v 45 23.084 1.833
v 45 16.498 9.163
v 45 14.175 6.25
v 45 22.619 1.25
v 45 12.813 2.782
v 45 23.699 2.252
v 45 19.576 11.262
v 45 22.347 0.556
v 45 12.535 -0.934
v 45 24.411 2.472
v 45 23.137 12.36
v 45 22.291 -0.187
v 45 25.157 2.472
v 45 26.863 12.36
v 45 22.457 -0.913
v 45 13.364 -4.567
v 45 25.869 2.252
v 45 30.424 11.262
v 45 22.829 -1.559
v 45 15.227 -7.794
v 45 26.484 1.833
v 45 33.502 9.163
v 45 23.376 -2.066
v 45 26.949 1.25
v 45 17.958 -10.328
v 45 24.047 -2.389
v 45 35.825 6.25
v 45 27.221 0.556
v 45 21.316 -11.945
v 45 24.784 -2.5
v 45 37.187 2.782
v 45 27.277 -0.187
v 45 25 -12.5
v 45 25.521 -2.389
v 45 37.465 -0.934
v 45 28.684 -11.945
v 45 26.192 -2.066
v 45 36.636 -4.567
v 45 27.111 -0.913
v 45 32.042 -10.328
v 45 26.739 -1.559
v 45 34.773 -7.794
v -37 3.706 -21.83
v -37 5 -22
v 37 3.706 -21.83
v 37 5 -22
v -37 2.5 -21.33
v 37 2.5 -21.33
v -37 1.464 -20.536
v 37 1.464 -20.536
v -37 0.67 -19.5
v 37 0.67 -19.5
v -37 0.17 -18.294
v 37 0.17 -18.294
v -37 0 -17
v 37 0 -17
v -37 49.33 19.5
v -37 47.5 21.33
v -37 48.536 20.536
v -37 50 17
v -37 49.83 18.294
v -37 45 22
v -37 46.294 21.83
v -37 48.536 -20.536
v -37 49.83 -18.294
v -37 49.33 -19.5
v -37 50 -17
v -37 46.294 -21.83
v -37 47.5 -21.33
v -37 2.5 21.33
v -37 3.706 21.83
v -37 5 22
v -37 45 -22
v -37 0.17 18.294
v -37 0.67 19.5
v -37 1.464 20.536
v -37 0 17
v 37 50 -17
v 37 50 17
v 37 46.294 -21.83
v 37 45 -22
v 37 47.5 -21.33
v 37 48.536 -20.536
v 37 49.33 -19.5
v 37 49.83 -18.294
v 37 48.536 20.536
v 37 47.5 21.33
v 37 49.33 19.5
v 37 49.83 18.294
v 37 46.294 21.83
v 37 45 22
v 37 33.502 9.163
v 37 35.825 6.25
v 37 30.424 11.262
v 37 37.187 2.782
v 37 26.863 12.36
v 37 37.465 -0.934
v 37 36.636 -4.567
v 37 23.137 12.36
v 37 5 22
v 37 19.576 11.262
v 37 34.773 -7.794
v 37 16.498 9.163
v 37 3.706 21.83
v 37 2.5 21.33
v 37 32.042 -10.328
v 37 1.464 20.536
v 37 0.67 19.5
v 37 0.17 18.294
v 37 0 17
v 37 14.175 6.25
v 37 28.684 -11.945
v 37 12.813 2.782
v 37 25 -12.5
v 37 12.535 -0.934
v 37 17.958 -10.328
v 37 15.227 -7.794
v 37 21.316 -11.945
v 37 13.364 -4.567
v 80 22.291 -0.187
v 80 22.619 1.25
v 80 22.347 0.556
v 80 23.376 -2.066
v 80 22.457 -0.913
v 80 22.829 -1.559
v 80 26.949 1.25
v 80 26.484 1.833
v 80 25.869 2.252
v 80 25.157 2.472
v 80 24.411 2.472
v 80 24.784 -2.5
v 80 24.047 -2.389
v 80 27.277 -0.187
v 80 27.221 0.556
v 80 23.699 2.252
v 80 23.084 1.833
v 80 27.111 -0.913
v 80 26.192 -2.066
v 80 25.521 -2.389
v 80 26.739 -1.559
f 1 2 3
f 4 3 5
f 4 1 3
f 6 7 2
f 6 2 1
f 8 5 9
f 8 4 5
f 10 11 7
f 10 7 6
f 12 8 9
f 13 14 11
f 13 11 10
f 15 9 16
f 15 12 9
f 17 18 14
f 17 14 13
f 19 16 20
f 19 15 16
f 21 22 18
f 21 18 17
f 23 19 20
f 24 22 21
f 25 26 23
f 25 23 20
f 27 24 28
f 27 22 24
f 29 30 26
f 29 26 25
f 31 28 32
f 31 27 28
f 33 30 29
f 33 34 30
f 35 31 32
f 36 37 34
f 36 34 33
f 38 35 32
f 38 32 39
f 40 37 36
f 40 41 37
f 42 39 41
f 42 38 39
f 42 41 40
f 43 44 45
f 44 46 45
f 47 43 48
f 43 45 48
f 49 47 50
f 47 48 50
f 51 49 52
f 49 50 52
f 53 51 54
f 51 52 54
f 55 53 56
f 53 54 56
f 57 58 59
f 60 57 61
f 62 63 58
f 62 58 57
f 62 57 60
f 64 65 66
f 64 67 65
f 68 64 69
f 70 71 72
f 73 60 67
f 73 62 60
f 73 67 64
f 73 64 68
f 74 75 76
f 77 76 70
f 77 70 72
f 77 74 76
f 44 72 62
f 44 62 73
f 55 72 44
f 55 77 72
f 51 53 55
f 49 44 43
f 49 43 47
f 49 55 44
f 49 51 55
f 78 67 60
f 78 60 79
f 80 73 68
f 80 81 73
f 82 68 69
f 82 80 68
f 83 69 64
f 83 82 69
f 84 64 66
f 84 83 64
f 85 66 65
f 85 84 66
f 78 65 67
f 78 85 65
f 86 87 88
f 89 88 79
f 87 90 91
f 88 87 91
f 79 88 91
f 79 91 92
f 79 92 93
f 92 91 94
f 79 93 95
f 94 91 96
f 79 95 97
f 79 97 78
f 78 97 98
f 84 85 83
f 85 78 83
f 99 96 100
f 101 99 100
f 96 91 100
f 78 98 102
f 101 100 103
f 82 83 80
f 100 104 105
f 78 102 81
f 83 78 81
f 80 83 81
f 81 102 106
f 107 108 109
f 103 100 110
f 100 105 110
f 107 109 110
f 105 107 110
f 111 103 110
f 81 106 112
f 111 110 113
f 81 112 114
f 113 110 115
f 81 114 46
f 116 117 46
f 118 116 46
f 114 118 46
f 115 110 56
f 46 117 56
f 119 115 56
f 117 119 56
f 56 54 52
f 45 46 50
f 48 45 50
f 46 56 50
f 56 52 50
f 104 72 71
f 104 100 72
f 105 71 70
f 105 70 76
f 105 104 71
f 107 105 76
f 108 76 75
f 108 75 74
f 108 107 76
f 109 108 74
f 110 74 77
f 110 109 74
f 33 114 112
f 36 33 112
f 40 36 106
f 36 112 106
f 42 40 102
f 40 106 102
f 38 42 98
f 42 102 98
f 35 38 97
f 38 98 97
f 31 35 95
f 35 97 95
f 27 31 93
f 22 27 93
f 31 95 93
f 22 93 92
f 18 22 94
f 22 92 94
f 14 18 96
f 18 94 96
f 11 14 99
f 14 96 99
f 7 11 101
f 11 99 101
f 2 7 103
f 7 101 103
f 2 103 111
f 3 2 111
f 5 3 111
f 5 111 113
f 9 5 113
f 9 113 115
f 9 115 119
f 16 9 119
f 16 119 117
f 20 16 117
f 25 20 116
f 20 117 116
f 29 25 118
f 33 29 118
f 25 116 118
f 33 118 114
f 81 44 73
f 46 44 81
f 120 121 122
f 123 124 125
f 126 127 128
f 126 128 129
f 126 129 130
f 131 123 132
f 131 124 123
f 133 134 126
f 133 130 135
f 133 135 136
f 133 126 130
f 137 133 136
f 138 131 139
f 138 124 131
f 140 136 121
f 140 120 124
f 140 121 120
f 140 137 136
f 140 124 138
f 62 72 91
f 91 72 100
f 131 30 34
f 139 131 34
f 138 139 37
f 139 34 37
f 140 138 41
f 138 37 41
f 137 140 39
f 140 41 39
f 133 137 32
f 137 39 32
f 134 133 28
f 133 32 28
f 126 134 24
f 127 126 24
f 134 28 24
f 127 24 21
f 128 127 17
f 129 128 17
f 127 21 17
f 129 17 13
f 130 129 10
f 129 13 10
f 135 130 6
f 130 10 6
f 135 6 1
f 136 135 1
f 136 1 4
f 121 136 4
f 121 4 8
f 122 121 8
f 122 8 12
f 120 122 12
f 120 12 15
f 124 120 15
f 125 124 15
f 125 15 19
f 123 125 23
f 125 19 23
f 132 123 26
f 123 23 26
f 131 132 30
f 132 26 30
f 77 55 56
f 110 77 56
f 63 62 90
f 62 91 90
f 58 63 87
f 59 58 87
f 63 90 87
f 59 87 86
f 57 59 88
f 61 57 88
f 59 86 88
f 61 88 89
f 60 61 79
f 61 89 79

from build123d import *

# Parameters (mm, degrees)
SKETCH1_W           = 74
SKETCH1_H           = 44
BOSS_EXTRUDE1_DEPTH = 50
SKETCH2_R           = 12.5
BOSS_EXTRUDE2_DEPTH = 8
SKETCH3_R           = 2.5
BOSS_EXTRUDE3_DEPTH = 35
FILLET1_R           = 5


with BuildPart() as part:
    # Sketch1 → Boss-Extrude1 (new body)
    with BuildSketch(Plane(origin=(0, 0, 0), x_dir=(1, 0, 0), z_dir=(0, 1, 0))):
        Rectangle(SKETCH1_W, SKETCH1_H)
    extrude(amount=BOSS_EXTRUDE1_DEPTH)

    # Sketch2 → Boss-Extrude2 (add)
    with BuildSketch(Plane(origin=(37, 0, 0), x_dir=(0, 0, -1), z_dir=(1, 0, 0))):
        with Locations((0, 25)):
            Circle(SKETCH2_R)
    extrude(amount=BOSS_EXTRUDE2_DEPTH)

    # Sketch3 → Boss-Extrude3 (add)
    with BuildSketch(Plane(origin=(45, 0, 0), x_dir=(0, 0, -1), z_dir=(1, 0, 0))):
        with Locations((0, 24.783973011)):
            Circle(SKETCH3_R)
    extrude(amount=BOSS_EXTRUDE3_DEPTH)

    # Fillet1
    fillet1_edges = [part.edges().sort_by_distance(p)[0] for p in [
        (0, 50, 22),
        (0, 0, 22),
        (0, 0, -22),
        (0, 50, -22),
    ]]
    fillet(fillet1_edges, radius=FILLET1_R)


solid = part.part
